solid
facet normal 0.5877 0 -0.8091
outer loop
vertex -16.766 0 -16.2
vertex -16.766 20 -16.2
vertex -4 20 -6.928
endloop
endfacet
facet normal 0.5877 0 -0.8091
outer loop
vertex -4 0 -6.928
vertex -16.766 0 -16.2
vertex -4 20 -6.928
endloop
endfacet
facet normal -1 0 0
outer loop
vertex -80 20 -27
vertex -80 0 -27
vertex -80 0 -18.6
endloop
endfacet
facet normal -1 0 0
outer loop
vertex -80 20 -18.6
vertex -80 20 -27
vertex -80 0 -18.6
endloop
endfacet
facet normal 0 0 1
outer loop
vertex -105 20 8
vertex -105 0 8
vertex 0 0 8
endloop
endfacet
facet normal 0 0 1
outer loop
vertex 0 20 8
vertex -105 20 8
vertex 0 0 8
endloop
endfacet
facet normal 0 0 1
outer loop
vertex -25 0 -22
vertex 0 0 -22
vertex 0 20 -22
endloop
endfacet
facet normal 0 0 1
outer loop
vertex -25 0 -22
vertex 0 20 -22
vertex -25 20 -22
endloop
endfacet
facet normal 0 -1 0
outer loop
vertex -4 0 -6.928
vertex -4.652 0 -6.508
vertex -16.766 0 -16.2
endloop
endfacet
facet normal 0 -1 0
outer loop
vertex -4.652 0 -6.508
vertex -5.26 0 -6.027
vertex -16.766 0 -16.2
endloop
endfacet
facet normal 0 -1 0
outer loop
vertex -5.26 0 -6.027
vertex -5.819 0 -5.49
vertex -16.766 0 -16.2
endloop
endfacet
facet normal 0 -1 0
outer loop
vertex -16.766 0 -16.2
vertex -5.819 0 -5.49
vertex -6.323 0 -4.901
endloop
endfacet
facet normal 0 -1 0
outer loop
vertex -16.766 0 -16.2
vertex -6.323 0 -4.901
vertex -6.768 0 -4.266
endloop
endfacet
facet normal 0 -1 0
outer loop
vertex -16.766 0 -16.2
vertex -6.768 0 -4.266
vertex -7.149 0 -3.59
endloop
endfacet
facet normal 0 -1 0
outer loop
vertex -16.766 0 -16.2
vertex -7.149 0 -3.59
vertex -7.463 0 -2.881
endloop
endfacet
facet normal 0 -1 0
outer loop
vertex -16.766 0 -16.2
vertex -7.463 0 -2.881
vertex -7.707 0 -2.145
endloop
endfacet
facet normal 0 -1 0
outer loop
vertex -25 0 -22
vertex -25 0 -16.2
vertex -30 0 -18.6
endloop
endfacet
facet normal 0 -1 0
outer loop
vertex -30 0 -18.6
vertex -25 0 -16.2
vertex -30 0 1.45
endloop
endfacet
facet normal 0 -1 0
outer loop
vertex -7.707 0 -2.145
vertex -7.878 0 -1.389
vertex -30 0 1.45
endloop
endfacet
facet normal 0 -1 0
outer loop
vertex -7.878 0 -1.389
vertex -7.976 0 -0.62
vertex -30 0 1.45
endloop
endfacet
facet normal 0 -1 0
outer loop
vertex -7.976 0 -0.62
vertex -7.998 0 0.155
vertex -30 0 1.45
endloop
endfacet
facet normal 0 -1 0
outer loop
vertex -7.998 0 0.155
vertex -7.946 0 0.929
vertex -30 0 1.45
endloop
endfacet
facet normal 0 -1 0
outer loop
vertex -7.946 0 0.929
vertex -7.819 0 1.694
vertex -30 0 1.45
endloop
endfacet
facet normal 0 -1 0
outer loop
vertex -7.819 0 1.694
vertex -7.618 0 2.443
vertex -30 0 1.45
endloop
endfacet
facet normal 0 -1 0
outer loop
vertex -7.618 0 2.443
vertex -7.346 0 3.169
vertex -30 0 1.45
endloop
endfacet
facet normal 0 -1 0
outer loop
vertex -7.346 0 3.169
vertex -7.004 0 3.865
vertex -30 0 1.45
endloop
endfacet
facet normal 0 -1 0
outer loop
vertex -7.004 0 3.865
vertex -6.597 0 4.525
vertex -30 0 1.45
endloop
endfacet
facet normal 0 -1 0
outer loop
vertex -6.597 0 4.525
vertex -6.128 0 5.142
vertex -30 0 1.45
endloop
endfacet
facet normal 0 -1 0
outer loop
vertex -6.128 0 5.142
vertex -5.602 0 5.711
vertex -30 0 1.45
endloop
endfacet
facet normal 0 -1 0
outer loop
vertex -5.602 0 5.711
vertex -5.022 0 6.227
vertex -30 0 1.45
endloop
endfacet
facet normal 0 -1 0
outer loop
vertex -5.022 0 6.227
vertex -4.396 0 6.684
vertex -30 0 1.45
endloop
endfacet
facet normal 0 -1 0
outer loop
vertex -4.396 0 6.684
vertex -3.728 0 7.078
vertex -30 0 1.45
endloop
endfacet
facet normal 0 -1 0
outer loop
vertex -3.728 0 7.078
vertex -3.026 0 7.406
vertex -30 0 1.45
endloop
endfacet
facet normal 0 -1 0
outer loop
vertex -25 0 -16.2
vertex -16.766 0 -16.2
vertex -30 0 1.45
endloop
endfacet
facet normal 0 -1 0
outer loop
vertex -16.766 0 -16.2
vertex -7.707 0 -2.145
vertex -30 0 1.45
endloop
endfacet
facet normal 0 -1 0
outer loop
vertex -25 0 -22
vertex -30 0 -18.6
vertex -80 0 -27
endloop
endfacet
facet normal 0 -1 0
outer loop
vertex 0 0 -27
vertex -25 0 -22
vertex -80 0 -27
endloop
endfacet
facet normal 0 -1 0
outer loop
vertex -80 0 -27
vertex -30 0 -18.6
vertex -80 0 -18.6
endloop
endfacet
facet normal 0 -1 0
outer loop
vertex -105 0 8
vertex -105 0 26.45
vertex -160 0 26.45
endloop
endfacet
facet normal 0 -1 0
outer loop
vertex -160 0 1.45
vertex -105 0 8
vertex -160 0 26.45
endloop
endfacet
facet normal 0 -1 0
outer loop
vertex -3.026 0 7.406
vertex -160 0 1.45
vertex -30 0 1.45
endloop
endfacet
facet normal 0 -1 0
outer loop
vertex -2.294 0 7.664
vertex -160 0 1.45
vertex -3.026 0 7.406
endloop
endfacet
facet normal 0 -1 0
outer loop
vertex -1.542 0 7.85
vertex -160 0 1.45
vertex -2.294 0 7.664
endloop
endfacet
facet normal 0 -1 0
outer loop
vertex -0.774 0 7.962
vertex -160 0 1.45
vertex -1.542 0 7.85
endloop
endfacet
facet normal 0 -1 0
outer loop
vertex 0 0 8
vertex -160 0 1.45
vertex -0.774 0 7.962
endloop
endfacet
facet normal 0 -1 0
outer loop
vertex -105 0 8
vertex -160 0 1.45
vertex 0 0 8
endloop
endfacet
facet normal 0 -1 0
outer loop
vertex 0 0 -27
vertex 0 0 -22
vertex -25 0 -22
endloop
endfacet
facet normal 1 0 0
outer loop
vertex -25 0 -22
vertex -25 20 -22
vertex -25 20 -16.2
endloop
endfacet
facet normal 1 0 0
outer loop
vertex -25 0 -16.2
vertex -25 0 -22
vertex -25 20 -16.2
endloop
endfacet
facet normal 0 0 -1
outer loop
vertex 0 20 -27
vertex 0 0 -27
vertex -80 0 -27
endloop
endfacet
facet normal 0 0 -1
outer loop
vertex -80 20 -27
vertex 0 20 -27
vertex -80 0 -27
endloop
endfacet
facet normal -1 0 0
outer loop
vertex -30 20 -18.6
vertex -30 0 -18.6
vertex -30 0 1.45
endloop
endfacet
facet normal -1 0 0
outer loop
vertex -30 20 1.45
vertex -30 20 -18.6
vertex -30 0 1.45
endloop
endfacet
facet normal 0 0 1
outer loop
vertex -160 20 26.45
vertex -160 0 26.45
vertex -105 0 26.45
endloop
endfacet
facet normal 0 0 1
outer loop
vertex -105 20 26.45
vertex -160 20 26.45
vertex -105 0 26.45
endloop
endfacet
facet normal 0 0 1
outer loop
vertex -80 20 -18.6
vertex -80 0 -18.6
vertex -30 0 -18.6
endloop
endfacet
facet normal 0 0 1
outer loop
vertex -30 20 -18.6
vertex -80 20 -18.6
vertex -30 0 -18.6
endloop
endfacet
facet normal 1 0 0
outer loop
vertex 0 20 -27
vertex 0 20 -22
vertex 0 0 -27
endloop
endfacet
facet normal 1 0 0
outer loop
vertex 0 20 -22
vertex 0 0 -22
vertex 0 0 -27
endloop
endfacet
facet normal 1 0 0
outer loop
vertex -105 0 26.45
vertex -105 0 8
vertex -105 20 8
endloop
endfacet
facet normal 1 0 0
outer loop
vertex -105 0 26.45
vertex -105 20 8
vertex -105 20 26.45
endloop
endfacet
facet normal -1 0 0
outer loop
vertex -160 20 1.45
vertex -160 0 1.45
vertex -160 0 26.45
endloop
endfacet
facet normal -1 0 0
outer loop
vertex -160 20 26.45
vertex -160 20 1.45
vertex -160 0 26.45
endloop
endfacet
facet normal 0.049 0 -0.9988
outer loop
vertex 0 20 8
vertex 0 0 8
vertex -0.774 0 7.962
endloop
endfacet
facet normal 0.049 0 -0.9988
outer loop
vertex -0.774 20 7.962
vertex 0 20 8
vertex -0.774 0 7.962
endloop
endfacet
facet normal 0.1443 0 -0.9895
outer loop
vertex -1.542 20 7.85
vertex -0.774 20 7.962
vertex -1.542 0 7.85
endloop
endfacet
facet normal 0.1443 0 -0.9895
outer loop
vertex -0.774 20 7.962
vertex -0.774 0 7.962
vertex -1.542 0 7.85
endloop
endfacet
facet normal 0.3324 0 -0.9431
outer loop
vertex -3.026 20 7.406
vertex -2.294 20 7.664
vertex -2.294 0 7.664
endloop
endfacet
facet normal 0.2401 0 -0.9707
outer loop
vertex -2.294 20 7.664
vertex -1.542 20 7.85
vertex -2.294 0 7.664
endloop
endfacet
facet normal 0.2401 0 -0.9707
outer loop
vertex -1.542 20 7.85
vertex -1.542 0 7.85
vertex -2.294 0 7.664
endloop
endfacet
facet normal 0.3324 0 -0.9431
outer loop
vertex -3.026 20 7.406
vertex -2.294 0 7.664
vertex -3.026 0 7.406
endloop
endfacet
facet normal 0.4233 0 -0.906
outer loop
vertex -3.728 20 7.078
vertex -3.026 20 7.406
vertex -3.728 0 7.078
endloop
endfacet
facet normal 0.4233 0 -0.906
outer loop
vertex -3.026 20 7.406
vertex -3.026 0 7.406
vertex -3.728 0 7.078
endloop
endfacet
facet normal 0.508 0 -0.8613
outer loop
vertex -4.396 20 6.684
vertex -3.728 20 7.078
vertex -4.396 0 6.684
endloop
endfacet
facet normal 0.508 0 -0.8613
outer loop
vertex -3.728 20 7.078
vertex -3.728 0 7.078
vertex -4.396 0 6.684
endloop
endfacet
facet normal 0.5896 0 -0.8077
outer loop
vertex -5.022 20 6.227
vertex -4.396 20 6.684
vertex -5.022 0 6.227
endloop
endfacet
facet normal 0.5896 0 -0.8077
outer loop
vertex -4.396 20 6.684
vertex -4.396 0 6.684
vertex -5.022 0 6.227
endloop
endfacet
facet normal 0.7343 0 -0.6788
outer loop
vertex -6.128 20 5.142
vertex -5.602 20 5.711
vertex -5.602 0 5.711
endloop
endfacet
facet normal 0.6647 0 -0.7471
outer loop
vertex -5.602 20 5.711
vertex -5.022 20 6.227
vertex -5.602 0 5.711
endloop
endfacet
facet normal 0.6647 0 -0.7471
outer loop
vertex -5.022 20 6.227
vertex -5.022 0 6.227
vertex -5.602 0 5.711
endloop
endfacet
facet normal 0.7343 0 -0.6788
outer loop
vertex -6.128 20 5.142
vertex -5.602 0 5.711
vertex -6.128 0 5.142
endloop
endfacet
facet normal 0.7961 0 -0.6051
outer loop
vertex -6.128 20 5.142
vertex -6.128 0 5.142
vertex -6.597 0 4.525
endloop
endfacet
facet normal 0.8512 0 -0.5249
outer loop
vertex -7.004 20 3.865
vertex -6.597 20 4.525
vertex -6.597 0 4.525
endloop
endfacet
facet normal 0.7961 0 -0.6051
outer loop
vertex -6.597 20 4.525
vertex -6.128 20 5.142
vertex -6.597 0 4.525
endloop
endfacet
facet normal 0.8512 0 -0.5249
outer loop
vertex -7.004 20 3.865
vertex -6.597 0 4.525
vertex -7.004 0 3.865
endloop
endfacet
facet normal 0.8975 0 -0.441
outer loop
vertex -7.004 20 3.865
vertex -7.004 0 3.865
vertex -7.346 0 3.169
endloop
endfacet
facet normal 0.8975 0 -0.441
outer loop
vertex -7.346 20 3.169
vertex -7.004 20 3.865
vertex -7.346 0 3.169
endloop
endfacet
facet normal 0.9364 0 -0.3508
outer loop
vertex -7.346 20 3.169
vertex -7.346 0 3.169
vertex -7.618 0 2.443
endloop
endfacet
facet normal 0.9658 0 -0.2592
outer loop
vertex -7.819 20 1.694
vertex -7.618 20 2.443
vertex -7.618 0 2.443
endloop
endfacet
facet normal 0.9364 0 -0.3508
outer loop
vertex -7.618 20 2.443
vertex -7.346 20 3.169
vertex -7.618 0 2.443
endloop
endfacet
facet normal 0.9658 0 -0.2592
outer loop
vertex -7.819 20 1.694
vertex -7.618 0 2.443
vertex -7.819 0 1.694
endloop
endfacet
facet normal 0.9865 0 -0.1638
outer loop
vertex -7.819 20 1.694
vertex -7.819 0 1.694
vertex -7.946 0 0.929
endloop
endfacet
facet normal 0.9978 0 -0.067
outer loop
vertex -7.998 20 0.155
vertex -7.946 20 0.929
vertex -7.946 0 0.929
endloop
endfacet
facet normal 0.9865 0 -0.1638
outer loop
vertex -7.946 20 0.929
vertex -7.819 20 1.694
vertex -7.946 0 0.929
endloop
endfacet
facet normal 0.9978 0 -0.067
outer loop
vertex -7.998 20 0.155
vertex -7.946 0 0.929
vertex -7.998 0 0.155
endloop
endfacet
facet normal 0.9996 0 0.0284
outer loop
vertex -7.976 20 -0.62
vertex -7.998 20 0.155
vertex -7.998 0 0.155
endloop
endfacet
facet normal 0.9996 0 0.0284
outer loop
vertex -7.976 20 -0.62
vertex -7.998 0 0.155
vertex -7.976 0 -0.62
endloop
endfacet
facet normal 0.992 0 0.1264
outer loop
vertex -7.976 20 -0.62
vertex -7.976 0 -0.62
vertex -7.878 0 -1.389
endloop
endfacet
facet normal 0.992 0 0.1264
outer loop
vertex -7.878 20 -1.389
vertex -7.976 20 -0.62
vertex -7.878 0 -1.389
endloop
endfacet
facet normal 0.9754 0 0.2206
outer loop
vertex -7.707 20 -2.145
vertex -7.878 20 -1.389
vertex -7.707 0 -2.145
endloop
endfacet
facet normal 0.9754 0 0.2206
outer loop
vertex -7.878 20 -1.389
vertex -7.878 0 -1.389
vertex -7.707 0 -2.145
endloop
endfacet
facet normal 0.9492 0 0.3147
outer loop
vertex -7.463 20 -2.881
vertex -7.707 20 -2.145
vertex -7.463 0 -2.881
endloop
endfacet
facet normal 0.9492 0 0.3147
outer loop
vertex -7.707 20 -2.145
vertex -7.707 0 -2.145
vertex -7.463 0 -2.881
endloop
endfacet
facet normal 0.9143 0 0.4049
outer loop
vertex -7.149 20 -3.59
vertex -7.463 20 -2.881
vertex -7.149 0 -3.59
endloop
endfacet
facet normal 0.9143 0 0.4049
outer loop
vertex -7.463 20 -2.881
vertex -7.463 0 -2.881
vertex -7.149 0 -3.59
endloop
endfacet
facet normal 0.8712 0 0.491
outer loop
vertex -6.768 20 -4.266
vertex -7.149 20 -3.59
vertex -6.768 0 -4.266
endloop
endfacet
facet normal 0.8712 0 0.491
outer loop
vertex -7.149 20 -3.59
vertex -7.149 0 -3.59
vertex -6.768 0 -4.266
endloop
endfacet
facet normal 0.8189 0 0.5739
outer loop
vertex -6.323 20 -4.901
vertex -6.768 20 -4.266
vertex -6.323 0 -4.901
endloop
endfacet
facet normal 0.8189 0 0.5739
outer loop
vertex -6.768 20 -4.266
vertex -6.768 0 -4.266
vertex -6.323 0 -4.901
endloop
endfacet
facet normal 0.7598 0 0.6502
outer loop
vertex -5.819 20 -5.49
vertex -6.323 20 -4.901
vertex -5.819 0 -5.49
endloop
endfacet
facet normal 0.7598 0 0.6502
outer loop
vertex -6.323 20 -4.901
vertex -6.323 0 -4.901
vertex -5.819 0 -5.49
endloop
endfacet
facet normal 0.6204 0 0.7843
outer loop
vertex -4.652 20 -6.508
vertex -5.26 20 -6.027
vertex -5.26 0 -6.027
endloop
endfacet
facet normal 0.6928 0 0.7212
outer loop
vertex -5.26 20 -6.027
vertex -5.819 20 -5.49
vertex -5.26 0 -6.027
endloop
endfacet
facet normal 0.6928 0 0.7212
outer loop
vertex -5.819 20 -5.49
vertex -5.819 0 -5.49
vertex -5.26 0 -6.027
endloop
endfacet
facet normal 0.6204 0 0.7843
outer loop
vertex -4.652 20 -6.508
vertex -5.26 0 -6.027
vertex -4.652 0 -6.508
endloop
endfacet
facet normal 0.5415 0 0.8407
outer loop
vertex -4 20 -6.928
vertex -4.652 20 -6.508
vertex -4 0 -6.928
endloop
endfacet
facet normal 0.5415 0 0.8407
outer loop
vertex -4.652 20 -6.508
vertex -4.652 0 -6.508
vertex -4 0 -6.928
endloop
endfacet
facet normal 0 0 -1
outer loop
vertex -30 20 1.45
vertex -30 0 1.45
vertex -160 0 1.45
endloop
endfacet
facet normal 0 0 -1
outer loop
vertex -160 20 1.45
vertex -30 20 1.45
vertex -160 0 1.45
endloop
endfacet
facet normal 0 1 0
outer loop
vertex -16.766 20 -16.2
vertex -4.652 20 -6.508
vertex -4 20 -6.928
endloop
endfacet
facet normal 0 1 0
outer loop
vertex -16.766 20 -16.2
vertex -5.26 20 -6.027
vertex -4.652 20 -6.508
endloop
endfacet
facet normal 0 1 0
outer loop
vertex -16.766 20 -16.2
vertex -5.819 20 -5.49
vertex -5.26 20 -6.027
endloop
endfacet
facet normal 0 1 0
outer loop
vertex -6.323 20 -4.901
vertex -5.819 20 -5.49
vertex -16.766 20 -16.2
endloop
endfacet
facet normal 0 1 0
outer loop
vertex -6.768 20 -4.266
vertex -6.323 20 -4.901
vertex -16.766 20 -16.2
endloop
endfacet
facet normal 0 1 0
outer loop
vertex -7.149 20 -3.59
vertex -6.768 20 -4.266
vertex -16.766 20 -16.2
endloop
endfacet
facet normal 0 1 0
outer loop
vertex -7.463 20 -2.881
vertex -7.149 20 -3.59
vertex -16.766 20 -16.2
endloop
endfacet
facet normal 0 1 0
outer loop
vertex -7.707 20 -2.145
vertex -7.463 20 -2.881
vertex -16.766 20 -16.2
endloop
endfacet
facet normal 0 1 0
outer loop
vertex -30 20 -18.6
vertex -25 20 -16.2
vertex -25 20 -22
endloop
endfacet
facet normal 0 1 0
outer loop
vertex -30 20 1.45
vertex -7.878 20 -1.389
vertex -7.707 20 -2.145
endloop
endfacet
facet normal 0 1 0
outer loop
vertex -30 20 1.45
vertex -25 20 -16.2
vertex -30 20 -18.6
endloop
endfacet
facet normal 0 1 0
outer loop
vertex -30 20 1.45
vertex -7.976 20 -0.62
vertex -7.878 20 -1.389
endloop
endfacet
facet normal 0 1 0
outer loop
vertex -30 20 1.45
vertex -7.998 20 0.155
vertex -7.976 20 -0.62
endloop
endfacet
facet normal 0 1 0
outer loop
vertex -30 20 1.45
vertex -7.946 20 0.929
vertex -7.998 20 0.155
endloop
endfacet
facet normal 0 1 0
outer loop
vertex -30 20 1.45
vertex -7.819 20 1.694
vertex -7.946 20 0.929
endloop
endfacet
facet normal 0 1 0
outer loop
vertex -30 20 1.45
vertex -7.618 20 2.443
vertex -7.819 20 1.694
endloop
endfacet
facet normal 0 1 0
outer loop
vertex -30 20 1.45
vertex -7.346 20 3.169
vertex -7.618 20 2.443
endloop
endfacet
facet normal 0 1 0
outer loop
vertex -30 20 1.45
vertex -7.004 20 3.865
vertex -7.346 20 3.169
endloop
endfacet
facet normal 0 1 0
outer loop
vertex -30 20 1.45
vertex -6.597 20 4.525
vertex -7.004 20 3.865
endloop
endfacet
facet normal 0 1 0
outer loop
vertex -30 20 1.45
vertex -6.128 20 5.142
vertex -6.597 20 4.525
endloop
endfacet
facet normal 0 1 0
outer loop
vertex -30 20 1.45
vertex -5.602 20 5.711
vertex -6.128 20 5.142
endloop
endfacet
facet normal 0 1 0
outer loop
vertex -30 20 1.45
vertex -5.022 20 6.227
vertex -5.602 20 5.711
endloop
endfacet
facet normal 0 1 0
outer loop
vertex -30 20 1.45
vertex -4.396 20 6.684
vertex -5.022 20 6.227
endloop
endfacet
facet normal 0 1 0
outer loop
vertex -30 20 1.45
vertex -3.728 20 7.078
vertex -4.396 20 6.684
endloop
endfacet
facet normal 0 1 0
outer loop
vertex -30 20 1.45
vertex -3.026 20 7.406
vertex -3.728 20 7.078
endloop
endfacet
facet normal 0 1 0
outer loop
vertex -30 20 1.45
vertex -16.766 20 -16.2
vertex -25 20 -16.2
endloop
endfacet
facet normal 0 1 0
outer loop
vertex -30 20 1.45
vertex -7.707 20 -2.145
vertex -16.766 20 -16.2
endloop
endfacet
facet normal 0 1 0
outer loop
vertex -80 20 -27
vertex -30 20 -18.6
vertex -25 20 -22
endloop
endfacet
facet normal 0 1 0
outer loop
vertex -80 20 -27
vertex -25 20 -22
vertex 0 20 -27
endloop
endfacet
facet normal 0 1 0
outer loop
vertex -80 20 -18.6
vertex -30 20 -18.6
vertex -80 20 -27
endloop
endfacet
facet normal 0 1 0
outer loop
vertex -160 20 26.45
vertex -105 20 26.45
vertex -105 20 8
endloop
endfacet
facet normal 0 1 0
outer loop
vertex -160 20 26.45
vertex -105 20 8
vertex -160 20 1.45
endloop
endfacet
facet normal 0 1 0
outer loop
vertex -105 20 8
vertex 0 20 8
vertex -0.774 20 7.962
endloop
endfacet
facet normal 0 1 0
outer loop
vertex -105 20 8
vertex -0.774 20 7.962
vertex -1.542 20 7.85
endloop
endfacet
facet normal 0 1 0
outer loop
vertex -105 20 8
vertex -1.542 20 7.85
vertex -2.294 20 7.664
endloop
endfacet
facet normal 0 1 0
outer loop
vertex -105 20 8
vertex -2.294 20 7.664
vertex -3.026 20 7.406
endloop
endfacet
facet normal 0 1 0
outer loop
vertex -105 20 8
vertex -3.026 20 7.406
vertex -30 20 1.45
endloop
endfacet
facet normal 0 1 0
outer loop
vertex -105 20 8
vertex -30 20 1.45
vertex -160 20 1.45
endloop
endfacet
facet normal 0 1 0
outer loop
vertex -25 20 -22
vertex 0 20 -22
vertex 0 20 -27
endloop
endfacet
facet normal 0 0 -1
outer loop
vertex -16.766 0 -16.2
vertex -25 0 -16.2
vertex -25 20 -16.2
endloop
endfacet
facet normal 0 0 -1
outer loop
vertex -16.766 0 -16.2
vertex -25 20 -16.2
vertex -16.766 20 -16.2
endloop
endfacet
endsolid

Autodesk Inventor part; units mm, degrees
ref_plane "YZ Plane" through (0, 0, 0) normal (1, 0, 0) x (0, 1, 0)
ref_plane "XZ Plane" through (0, 0, 0) normal (0, 1, 0) x (-1, 0, 0)
ref_plane "XY Plane" through (0, 0, 0) normal (0, 0, 1) x (1, 0, 0)
sketch "Skizze1" plane through (0, 0, 0) normal (0, 1, 0) x (-1, 0, 0)
  arc A0 (4, -6.9282) -> (0, 8) centre (0, 0) ccw
  line L0 (0, -22) -> (0, -27)
  line L1 (0, -27) -> (30, -27)
  line L2 (80, 8) -> (0, 8)
  line L3 (0, -22) -> (25, -22)
  line L4 (25, -22) -> (0, -22)
  line L5 (25, -22) -> (25, -16.2)
  line L6 (25, -16) -> (25, -22)
  line L7 (25, -16.2) -> (16.7663, -16.2)
  line L8 (16.7663, -16.2) -> (4, -6.9282)
  line L9 (30, -27) -> (80, -27)
  line L10 (80, -27) -> (80, -18.6)
  line L11 (80, -18.6) -> (30, -18.6)
  line L12 (80, 1.45) -> (30, 1.45)
  line L13 (30, -18.6) -> (30, 1.45)
  line L14 (80, 1.45) -> (160, 1.45)
  line L15 (80, 1.45) -> (160, 1.45) construction
  line L16 (160, 1.45) -> (160, 26.45)
  line L17 (160, 26.45) -> (105, 26.45)
  line L18 (80, 8) -> (105, 8)
  line L19 (105, 8) -> (105, 26.45)
  circle A1 centre (119.5, 13.95) radius 8.025
  circle A2 centre (145.5, 13.95) radius 8.025
  dimension "d0" = 5
  dimension "d9" = 50
  dimension "d10" = 8.4
  dimension "d12" = 20.05
  dimension "d17" = 0
  dimension "d18" = 25
  dimension "d19" = 55
  dimension "d20" = 160
  dimension "d21" = 8
  dimension "d22" = 30
  dimension "d23" = 16.05
  dimension "d24" = 16.05
  dimension "d25" = 12.5
  dimension "d26" = 12.5
  dimension "d28" = 26
  dimension "d29" = 14.5
extrude "Extrusion1" add sketch "Skizze1" along normal blind 20 contours A0 L2 L18 L19 L17 L16 L14 L12 L13 L11 L10 L9 L1 L0 L3 L5 L7 L8 | A1 | A2
properties part number "Halterung_MobileWhiteboard_V3_Ultrasonic scanner"
